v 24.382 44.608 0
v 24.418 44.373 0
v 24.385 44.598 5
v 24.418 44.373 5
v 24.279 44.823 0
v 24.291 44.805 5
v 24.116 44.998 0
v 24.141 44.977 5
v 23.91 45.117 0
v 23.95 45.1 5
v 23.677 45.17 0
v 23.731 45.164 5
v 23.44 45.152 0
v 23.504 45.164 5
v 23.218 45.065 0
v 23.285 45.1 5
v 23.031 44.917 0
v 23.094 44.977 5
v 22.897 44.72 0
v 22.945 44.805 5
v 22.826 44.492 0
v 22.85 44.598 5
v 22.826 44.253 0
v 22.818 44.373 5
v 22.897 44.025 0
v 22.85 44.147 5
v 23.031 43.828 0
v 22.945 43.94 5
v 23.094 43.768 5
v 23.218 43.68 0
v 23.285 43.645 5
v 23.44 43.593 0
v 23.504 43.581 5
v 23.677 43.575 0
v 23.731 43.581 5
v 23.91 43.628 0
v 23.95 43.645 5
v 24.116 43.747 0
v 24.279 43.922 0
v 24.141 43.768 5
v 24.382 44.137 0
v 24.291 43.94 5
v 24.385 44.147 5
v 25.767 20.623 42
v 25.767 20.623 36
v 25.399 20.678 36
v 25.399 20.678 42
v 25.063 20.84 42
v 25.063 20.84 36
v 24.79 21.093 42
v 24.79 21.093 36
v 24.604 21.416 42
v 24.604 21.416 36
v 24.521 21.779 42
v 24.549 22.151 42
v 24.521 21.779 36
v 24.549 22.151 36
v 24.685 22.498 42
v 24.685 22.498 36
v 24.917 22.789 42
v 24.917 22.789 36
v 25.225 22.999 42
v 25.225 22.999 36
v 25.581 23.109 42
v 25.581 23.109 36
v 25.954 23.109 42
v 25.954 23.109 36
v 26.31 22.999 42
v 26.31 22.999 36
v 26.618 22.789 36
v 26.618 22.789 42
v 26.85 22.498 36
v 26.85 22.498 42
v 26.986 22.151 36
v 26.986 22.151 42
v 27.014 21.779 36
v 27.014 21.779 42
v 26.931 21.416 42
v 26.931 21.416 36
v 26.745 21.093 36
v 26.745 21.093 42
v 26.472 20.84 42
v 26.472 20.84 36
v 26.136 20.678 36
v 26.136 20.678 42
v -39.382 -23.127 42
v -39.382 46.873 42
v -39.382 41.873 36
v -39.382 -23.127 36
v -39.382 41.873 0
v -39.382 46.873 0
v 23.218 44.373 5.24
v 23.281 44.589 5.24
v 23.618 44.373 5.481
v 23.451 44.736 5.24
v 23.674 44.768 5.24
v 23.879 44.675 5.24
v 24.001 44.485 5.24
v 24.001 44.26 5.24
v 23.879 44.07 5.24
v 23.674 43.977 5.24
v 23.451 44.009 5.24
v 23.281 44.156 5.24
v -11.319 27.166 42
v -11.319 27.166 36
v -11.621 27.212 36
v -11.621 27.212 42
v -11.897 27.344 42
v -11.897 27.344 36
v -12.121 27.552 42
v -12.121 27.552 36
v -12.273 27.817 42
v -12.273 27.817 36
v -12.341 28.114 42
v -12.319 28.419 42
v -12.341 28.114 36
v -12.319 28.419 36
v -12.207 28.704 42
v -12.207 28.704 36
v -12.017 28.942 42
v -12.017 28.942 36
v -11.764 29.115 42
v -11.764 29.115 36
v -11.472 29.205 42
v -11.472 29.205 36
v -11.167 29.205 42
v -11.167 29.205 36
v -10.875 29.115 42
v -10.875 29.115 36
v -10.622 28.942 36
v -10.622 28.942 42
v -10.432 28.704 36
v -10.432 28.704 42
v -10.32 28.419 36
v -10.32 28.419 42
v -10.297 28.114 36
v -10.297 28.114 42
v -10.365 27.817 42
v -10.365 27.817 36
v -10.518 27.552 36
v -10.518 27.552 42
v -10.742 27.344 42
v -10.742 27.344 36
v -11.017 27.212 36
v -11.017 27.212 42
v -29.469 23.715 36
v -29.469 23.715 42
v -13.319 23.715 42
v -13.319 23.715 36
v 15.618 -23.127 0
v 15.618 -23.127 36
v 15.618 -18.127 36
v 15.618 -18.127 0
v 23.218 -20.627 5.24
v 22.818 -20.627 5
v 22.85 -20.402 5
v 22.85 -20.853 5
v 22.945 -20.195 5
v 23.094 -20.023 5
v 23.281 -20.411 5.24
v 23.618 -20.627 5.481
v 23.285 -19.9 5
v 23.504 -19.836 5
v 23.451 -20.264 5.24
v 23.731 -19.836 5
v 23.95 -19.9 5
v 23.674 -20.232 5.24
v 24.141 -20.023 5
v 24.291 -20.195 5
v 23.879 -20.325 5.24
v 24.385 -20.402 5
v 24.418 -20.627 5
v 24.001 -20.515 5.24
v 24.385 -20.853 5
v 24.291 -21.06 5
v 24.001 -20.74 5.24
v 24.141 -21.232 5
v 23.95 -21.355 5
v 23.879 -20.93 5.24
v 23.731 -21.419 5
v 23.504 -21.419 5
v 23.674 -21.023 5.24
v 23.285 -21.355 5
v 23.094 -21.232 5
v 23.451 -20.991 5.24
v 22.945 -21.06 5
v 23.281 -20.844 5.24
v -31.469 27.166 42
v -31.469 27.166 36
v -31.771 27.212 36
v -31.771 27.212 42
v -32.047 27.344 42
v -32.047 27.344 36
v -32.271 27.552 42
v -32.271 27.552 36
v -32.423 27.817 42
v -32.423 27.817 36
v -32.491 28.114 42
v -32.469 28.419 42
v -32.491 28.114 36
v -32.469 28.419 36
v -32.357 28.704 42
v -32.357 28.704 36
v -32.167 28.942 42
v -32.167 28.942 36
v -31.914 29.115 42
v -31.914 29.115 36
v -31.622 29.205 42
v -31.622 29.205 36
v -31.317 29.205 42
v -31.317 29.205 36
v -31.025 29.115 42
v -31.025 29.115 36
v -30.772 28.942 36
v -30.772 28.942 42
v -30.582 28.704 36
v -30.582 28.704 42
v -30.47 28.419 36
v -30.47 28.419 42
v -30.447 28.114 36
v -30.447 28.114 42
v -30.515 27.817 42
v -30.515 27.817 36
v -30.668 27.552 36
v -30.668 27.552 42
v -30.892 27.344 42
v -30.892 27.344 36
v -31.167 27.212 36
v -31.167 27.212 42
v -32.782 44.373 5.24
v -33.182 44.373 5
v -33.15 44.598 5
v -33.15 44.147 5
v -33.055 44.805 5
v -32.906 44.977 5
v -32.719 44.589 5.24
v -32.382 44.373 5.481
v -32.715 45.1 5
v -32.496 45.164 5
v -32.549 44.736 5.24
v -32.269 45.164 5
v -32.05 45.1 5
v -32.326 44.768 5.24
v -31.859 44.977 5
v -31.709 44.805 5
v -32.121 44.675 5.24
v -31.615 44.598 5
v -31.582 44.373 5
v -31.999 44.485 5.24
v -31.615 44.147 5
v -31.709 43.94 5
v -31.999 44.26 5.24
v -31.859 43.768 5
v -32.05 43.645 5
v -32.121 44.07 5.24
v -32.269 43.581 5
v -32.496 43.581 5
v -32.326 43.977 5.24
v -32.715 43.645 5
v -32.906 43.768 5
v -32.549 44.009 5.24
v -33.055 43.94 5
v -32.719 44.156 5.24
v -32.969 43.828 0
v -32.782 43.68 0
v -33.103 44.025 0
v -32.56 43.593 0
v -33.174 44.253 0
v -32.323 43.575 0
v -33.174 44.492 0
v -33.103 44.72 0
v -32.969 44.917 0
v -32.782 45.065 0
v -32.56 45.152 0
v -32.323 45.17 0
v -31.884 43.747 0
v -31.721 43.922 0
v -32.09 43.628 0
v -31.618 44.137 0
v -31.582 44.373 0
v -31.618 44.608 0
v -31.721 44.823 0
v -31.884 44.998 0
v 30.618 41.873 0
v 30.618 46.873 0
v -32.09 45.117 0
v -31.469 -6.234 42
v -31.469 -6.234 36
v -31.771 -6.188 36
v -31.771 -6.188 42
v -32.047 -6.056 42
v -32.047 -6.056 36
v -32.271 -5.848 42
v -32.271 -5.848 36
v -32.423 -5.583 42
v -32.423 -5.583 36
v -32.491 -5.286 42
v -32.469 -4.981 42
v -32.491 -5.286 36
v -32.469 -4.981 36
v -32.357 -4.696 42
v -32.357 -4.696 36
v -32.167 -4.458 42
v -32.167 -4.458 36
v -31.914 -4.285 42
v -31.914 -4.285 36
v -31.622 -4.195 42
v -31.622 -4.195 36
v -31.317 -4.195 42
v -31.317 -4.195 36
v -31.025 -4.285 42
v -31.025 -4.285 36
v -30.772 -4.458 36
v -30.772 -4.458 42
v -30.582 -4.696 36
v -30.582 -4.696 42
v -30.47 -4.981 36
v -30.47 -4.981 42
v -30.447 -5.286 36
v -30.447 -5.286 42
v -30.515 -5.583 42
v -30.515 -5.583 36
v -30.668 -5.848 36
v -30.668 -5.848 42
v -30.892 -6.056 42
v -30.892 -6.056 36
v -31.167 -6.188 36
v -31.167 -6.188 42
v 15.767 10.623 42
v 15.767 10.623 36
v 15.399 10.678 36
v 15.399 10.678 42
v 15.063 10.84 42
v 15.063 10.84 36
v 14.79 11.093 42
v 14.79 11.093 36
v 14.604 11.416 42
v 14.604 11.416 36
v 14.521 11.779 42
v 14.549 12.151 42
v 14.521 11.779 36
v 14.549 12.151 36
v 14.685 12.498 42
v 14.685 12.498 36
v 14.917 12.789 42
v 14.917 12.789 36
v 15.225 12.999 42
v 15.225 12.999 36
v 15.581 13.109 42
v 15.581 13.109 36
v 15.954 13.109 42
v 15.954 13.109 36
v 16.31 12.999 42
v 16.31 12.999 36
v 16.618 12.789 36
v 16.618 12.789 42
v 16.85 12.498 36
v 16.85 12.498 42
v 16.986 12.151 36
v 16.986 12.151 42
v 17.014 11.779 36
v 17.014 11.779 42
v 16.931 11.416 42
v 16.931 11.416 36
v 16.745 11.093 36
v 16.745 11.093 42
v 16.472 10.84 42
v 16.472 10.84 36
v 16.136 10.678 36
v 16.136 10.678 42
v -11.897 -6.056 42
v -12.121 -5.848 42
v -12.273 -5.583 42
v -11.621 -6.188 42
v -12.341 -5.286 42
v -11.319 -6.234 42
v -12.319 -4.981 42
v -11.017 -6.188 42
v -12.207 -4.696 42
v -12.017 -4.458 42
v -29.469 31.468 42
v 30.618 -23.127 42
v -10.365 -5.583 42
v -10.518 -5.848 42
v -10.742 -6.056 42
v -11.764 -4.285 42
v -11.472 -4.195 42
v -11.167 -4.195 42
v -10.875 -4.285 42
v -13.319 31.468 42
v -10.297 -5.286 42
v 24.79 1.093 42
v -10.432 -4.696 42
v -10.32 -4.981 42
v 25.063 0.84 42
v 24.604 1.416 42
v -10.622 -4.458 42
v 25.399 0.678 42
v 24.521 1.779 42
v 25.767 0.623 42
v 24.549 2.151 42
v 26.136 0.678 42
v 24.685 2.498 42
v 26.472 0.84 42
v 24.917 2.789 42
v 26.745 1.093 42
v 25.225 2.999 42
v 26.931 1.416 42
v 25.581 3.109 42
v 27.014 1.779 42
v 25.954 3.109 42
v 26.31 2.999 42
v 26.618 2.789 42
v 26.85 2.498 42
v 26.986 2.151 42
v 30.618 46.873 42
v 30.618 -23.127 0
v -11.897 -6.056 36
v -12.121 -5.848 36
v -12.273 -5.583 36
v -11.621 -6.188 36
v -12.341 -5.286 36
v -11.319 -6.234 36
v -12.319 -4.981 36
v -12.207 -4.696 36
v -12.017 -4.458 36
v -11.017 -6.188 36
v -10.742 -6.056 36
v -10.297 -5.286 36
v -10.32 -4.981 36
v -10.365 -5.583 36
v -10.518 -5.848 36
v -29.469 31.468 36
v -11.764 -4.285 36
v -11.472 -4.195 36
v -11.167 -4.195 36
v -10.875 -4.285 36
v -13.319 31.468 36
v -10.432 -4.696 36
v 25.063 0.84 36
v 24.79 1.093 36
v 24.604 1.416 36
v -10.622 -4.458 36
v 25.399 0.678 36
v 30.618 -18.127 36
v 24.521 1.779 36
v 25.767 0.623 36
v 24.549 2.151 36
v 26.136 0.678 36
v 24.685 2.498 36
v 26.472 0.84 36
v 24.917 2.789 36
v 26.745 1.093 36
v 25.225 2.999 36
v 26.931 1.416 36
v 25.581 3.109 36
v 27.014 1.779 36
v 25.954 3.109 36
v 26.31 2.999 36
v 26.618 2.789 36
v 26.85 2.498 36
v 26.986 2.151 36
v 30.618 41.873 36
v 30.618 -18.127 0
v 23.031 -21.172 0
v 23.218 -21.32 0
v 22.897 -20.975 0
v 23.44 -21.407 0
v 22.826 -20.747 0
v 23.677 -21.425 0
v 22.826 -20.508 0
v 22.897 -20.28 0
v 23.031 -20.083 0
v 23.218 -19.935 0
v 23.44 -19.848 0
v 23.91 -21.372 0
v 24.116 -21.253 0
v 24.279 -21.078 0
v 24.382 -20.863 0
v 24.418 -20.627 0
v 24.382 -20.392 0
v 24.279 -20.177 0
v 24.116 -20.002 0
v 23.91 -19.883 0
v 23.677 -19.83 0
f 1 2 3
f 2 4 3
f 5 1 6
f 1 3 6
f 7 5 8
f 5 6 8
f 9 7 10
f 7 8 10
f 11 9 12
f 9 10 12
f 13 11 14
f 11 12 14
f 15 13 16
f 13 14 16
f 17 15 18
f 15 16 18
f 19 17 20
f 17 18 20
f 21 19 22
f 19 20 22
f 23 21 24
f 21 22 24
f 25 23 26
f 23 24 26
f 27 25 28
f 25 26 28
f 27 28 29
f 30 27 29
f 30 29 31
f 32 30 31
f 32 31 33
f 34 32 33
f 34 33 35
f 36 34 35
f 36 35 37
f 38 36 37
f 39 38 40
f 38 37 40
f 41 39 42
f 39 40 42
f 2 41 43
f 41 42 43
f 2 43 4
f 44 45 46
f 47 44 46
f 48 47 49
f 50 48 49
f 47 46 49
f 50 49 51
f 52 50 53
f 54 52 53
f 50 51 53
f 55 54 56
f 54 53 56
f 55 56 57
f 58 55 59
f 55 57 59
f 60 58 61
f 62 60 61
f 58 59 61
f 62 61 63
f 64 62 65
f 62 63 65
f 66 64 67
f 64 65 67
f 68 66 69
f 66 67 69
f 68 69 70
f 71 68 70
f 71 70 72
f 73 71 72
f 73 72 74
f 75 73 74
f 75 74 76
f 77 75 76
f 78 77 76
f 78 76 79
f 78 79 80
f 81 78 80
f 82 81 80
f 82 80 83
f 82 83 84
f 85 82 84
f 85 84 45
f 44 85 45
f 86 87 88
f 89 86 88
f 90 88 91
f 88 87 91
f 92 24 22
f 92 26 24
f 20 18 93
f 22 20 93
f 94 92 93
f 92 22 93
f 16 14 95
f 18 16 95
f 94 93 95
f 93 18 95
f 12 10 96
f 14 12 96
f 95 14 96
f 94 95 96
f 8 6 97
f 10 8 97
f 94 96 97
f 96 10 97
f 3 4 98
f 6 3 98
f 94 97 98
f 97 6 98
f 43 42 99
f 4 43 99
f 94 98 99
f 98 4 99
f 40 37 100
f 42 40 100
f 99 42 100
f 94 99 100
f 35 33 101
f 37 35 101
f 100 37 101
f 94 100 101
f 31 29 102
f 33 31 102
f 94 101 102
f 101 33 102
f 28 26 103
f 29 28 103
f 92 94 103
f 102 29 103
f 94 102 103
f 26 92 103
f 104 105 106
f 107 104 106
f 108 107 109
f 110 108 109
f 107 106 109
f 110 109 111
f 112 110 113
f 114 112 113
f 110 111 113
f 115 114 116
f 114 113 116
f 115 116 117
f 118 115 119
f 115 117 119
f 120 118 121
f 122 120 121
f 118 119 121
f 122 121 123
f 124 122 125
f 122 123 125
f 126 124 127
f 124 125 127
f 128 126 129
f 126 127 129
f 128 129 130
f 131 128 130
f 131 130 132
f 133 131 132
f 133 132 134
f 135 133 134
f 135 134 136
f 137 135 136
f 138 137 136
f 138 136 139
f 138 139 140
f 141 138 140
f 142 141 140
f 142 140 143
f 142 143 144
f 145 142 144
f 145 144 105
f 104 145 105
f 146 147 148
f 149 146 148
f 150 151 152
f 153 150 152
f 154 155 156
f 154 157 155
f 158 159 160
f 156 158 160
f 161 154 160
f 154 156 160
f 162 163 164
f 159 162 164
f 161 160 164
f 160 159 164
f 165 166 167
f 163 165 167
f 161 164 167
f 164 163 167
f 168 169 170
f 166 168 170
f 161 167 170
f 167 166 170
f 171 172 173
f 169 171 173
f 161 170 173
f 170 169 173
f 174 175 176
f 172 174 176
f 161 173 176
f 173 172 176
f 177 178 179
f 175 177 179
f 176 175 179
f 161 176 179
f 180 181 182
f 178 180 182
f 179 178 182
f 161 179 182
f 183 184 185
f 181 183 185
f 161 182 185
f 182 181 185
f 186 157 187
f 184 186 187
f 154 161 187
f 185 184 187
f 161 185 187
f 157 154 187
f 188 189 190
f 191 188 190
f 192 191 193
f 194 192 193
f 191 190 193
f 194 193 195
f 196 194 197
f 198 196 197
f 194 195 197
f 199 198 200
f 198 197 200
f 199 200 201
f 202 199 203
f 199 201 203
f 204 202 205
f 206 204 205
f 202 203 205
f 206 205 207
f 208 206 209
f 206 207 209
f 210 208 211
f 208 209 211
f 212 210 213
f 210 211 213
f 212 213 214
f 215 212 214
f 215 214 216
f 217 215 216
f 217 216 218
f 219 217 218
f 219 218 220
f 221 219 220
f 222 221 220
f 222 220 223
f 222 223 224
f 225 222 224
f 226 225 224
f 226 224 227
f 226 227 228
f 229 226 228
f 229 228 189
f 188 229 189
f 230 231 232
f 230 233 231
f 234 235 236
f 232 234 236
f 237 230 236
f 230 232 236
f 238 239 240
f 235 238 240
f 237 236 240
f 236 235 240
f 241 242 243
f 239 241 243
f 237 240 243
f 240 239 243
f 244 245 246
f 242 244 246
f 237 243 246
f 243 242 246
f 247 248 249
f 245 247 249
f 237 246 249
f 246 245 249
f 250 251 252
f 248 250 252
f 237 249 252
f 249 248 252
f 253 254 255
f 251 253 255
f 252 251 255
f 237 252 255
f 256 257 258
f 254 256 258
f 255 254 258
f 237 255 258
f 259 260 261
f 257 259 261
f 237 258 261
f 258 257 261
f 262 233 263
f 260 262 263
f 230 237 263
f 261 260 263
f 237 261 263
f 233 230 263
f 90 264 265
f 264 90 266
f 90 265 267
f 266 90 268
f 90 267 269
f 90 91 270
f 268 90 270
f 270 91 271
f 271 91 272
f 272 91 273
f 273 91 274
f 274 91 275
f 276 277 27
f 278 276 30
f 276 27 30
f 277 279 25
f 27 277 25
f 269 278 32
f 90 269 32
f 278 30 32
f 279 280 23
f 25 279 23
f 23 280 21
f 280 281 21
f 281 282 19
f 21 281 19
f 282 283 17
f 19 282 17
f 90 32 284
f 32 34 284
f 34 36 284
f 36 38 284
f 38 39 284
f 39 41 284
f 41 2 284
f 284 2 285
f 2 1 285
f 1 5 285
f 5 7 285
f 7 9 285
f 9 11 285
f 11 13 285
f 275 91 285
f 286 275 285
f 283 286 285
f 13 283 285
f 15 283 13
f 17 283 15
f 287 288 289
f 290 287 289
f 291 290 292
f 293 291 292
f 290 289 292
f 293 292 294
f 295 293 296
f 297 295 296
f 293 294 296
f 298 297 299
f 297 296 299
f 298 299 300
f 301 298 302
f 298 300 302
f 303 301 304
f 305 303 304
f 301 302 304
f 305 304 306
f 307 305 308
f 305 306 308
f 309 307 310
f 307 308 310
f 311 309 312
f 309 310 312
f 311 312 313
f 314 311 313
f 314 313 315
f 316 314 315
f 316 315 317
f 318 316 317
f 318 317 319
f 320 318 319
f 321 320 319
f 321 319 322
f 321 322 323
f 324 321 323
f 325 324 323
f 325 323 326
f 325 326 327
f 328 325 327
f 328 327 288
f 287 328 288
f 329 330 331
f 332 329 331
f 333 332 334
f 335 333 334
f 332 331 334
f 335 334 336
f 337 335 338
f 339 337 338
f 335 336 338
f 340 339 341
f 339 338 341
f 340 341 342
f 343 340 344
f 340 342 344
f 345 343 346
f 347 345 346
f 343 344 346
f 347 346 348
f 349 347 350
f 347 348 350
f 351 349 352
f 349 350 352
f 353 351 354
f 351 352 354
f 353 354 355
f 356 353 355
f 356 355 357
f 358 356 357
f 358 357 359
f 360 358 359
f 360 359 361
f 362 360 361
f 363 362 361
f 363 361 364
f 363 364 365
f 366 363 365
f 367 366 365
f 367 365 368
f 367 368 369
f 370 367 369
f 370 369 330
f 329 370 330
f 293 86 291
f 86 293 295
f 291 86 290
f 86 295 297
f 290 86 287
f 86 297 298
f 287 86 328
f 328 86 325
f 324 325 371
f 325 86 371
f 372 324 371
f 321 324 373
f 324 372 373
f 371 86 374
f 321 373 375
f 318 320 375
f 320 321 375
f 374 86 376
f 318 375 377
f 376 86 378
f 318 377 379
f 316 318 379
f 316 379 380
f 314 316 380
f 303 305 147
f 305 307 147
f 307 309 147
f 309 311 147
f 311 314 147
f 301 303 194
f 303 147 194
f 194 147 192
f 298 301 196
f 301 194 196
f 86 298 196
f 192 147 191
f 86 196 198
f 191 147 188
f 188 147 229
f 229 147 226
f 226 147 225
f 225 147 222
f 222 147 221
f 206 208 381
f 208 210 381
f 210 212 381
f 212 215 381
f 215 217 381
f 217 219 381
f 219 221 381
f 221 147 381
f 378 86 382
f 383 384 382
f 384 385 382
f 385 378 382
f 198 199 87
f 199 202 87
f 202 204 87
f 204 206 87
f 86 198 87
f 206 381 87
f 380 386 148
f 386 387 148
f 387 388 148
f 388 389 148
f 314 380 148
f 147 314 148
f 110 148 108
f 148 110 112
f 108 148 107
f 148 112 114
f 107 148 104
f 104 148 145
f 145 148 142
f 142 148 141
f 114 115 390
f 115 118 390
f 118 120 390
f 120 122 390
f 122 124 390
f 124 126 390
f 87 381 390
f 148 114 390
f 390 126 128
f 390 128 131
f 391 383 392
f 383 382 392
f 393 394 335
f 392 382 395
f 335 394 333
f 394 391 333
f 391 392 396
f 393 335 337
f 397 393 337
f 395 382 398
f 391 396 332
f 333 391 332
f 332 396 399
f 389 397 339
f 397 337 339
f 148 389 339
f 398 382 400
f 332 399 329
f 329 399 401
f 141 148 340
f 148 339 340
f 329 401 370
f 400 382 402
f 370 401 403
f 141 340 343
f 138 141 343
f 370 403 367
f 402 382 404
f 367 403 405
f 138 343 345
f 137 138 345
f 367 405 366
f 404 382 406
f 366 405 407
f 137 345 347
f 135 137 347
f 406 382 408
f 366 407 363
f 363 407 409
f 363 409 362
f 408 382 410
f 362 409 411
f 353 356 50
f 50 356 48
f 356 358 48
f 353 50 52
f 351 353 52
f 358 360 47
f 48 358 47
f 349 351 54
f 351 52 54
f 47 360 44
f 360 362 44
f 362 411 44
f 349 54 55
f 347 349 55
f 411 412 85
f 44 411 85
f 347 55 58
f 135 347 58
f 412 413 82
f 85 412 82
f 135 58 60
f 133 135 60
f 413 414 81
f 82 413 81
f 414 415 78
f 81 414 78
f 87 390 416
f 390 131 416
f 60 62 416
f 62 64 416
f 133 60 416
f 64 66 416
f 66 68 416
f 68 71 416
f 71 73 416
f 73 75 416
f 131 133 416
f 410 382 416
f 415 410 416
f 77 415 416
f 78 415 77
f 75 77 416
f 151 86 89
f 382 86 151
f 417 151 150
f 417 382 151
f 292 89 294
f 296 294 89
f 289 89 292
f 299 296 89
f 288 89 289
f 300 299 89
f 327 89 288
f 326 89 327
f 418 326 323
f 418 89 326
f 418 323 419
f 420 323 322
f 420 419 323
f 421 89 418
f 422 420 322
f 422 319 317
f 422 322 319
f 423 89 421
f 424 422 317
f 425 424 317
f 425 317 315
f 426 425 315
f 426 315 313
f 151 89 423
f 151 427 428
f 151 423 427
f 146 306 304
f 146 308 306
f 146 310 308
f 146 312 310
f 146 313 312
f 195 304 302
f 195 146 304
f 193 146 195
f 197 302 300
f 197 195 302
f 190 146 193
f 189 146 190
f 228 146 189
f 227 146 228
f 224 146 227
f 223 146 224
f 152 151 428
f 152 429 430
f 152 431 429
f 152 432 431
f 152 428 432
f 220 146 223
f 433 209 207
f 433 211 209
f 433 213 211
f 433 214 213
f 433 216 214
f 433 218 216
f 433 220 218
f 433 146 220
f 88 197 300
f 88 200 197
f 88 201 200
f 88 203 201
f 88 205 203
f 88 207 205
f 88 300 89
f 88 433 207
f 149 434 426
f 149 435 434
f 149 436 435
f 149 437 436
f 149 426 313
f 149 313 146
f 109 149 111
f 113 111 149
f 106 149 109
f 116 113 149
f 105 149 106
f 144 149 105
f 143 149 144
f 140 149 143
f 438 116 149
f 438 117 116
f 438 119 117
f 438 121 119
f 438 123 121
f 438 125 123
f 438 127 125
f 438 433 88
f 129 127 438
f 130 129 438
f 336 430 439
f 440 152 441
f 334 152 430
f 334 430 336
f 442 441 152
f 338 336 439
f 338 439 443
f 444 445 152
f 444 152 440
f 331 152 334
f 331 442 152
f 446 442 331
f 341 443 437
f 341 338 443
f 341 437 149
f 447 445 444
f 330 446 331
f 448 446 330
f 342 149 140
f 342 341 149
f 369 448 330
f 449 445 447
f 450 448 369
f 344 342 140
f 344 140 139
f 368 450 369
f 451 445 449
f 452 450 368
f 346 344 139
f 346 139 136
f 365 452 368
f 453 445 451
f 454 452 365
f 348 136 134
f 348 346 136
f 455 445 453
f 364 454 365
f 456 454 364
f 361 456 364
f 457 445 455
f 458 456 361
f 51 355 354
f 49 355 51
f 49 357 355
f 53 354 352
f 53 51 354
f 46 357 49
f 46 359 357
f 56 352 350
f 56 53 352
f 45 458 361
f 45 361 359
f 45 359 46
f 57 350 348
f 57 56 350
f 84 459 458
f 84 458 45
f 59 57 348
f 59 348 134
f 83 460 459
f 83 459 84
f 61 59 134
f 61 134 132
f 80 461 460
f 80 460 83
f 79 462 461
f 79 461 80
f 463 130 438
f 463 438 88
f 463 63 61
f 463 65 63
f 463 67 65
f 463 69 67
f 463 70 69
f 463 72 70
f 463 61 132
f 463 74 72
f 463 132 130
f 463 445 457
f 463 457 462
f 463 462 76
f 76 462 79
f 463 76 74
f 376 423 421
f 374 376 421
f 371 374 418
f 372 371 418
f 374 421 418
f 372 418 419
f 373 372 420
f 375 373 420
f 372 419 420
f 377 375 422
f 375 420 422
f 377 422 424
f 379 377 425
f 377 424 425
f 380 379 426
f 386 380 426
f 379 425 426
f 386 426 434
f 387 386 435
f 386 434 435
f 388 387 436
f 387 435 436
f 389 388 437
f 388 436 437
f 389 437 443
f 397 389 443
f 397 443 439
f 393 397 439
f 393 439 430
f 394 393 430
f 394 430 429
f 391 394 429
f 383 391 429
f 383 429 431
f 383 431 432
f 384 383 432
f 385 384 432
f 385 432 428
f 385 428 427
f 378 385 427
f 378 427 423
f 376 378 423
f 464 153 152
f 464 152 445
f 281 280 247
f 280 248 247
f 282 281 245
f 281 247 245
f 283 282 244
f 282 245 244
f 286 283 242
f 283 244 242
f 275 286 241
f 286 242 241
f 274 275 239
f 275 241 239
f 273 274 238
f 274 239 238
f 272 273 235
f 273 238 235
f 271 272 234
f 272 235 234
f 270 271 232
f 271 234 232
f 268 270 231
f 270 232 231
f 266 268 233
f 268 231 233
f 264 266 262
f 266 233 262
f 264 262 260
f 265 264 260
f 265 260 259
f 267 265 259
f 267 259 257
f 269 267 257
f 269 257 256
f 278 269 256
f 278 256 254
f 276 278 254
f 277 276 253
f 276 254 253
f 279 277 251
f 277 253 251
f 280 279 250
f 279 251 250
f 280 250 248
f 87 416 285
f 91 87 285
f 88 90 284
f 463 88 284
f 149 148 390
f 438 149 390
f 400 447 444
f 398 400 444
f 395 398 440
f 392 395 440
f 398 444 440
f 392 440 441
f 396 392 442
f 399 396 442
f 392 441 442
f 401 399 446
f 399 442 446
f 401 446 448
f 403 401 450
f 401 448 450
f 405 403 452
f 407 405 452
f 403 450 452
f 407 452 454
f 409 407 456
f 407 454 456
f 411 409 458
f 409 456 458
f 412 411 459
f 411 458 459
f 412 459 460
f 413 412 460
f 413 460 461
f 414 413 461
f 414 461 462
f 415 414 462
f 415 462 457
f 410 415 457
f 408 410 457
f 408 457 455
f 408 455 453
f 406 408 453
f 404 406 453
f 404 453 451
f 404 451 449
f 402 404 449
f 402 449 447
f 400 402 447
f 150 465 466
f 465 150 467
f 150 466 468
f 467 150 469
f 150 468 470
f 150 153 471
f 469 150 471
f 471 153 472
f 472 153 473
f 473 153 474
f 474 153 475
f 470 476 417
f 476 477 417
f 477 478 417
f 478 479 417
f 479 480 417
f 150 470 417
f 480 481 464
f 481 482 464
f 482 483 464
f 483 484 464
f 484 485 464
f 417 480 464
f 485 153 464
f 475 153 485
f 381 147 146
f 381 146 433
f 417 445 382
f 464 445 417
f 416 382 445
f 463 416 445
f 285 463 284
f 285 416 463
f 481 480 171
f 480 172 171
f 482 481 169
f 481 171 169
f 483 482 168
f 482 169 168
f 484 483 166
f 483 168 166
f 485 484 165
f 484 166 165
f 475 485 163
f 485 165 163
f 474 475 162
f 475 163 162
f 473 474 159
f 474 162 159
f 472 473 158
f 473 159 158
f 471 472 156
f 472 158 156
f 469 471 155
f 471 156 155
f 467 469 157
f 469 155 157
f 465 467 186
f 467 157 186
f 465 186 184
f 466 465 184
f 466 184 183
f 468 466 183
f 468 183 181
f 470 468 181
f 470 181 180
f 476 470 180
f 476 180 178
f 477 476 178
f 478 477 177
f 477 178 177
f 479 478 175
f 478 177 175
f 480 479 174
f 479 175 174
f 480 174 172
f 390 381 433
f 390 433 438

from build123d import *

# Parameters (mm, degrees)
SKETCH1_W             = 70
SKETCH1_H             = 5
BOSS_EXTRUDE1_DEPTH   = 36
SKETCH1_W_2           = 15
BOSS_EXTRUDE1_2_DEPTH = 36
SKETCH2_W             = 6
SKETCH2_H             = 70
BOSS_EXTRUDE2_DEPTH   = 70
M2_TAPPED_HOLE1_D     = 1.6
M2_TAPPED_HOLE1_DEPTH = 5
M2_TAPPED_HOLE1_TIP   = 0.480688495
M3_TAPPED_HOLE1_D     = 2.5
M2_5_TAPPED_HOLE1_D   = 2.05
SKETCH10_W            = 16.15
SKETCH10_H            = 7.752972879
CUT_EXTRUDE1_DEPTH    = 10


with BuildPart() as part:
    # Sketch1 → Boss-Extrude1 (new body)
    with BuildSketch(Plane.XY):
        with Locations((-4.38247012, 44.37250996)):
            Rectangle(SKETCH1_W, SKETCH1_H)
    extrude(amount=BOSS_EXTRUDE1_DEPTH)



with BuildPart() as body_2:
    # Sketch1 → Boss-Extrude1 2 (new body)
    with BuildSketch(Plane.XY):
        with Locations((23.11752988, -20.62749004)):
            Rectangle(SKETCH1_W_2, SKETCH1_H)
    extrude(amount=BOSS_EXTRUDE1_2_DEPTH)


with BuildPart() as part_1:
    add(part.part)

    add(body_2.part)  # Boss-Extrude2 merges body 2
    # Sketch2 → Boss-Extrude2 (add)
    with BuildSketch(Plane(origin=(30.61752988, 0, 0), x_dir=(0, 0, -1), z_dir=(1, 0, 0))):
        with Locations((-39, 11.87250996)):
            Rectangle(SKETCH2_W, SKETCH2_H)
    extrude(amount=-BOSS_EXTRUDE2_DEPTH)

    # M2 Tapped Hole1
    with Locations(Plane(origin=(23.61752988, 44.37250996, 0), x_dir=(-1, 0, 0), z_dir=(0, 0, -1))):
        with Locations((0, 0), (56, 0), (0, -65)):
            Hole(M2_TAPPED_HOLE1_D / 2, depth=M2_TAPPED_HOLE1_DEPTH)
            with Locations((0, 0, -(M2_TAPPED_HOLE1_DEPTH + M2_TAPPED_HOLE1_TIP / 2))):  # 118° drill point
                Cone(0, M2_TAPPED_HOLE1_D / 2, M2_TAPPED_HOLE1_TIP, mode=Mode.SUBTRACT)

    # M3 Tapped Hole1 (through all)
    with Locations(Plane(origin=(15.767468025, 11.87250996, 42), x_dir=(0, 1, 0), z_dir=(0, 0, 1))):
        with Locations((0, 0), (-10, -10), (10, -10)):
            Hole(M3_TAPPED_HOLE1_D / 2)

    # M2.5 Tapped Hole1 (through all)
    with Locations(Plane(origin=(-31.46932371, 28.191052792, 42), x_dir=(0, 1, 0), z_dir=(0, 0, 1))):
        with Locations((0, 0), (0, -20.15), (-33.4, -20.15), (-33.4, 0)):
            Hole(M2_5_TAPPED_HOLE1_D / 2)

    # Sketch10 → Cut-Extrude1 (cut)
    with BuildSketch(Plane.XY.offset(42)):
        with Locations((-21.39432371, 27.591449479)):
            Rectangle(SKETCH10_W, SKETCH10_H)
    extrude(amount=-CUT_EXTRUDE1_DEPTH, mode=Mode.SUBTRACT)


solid = part_1.part
